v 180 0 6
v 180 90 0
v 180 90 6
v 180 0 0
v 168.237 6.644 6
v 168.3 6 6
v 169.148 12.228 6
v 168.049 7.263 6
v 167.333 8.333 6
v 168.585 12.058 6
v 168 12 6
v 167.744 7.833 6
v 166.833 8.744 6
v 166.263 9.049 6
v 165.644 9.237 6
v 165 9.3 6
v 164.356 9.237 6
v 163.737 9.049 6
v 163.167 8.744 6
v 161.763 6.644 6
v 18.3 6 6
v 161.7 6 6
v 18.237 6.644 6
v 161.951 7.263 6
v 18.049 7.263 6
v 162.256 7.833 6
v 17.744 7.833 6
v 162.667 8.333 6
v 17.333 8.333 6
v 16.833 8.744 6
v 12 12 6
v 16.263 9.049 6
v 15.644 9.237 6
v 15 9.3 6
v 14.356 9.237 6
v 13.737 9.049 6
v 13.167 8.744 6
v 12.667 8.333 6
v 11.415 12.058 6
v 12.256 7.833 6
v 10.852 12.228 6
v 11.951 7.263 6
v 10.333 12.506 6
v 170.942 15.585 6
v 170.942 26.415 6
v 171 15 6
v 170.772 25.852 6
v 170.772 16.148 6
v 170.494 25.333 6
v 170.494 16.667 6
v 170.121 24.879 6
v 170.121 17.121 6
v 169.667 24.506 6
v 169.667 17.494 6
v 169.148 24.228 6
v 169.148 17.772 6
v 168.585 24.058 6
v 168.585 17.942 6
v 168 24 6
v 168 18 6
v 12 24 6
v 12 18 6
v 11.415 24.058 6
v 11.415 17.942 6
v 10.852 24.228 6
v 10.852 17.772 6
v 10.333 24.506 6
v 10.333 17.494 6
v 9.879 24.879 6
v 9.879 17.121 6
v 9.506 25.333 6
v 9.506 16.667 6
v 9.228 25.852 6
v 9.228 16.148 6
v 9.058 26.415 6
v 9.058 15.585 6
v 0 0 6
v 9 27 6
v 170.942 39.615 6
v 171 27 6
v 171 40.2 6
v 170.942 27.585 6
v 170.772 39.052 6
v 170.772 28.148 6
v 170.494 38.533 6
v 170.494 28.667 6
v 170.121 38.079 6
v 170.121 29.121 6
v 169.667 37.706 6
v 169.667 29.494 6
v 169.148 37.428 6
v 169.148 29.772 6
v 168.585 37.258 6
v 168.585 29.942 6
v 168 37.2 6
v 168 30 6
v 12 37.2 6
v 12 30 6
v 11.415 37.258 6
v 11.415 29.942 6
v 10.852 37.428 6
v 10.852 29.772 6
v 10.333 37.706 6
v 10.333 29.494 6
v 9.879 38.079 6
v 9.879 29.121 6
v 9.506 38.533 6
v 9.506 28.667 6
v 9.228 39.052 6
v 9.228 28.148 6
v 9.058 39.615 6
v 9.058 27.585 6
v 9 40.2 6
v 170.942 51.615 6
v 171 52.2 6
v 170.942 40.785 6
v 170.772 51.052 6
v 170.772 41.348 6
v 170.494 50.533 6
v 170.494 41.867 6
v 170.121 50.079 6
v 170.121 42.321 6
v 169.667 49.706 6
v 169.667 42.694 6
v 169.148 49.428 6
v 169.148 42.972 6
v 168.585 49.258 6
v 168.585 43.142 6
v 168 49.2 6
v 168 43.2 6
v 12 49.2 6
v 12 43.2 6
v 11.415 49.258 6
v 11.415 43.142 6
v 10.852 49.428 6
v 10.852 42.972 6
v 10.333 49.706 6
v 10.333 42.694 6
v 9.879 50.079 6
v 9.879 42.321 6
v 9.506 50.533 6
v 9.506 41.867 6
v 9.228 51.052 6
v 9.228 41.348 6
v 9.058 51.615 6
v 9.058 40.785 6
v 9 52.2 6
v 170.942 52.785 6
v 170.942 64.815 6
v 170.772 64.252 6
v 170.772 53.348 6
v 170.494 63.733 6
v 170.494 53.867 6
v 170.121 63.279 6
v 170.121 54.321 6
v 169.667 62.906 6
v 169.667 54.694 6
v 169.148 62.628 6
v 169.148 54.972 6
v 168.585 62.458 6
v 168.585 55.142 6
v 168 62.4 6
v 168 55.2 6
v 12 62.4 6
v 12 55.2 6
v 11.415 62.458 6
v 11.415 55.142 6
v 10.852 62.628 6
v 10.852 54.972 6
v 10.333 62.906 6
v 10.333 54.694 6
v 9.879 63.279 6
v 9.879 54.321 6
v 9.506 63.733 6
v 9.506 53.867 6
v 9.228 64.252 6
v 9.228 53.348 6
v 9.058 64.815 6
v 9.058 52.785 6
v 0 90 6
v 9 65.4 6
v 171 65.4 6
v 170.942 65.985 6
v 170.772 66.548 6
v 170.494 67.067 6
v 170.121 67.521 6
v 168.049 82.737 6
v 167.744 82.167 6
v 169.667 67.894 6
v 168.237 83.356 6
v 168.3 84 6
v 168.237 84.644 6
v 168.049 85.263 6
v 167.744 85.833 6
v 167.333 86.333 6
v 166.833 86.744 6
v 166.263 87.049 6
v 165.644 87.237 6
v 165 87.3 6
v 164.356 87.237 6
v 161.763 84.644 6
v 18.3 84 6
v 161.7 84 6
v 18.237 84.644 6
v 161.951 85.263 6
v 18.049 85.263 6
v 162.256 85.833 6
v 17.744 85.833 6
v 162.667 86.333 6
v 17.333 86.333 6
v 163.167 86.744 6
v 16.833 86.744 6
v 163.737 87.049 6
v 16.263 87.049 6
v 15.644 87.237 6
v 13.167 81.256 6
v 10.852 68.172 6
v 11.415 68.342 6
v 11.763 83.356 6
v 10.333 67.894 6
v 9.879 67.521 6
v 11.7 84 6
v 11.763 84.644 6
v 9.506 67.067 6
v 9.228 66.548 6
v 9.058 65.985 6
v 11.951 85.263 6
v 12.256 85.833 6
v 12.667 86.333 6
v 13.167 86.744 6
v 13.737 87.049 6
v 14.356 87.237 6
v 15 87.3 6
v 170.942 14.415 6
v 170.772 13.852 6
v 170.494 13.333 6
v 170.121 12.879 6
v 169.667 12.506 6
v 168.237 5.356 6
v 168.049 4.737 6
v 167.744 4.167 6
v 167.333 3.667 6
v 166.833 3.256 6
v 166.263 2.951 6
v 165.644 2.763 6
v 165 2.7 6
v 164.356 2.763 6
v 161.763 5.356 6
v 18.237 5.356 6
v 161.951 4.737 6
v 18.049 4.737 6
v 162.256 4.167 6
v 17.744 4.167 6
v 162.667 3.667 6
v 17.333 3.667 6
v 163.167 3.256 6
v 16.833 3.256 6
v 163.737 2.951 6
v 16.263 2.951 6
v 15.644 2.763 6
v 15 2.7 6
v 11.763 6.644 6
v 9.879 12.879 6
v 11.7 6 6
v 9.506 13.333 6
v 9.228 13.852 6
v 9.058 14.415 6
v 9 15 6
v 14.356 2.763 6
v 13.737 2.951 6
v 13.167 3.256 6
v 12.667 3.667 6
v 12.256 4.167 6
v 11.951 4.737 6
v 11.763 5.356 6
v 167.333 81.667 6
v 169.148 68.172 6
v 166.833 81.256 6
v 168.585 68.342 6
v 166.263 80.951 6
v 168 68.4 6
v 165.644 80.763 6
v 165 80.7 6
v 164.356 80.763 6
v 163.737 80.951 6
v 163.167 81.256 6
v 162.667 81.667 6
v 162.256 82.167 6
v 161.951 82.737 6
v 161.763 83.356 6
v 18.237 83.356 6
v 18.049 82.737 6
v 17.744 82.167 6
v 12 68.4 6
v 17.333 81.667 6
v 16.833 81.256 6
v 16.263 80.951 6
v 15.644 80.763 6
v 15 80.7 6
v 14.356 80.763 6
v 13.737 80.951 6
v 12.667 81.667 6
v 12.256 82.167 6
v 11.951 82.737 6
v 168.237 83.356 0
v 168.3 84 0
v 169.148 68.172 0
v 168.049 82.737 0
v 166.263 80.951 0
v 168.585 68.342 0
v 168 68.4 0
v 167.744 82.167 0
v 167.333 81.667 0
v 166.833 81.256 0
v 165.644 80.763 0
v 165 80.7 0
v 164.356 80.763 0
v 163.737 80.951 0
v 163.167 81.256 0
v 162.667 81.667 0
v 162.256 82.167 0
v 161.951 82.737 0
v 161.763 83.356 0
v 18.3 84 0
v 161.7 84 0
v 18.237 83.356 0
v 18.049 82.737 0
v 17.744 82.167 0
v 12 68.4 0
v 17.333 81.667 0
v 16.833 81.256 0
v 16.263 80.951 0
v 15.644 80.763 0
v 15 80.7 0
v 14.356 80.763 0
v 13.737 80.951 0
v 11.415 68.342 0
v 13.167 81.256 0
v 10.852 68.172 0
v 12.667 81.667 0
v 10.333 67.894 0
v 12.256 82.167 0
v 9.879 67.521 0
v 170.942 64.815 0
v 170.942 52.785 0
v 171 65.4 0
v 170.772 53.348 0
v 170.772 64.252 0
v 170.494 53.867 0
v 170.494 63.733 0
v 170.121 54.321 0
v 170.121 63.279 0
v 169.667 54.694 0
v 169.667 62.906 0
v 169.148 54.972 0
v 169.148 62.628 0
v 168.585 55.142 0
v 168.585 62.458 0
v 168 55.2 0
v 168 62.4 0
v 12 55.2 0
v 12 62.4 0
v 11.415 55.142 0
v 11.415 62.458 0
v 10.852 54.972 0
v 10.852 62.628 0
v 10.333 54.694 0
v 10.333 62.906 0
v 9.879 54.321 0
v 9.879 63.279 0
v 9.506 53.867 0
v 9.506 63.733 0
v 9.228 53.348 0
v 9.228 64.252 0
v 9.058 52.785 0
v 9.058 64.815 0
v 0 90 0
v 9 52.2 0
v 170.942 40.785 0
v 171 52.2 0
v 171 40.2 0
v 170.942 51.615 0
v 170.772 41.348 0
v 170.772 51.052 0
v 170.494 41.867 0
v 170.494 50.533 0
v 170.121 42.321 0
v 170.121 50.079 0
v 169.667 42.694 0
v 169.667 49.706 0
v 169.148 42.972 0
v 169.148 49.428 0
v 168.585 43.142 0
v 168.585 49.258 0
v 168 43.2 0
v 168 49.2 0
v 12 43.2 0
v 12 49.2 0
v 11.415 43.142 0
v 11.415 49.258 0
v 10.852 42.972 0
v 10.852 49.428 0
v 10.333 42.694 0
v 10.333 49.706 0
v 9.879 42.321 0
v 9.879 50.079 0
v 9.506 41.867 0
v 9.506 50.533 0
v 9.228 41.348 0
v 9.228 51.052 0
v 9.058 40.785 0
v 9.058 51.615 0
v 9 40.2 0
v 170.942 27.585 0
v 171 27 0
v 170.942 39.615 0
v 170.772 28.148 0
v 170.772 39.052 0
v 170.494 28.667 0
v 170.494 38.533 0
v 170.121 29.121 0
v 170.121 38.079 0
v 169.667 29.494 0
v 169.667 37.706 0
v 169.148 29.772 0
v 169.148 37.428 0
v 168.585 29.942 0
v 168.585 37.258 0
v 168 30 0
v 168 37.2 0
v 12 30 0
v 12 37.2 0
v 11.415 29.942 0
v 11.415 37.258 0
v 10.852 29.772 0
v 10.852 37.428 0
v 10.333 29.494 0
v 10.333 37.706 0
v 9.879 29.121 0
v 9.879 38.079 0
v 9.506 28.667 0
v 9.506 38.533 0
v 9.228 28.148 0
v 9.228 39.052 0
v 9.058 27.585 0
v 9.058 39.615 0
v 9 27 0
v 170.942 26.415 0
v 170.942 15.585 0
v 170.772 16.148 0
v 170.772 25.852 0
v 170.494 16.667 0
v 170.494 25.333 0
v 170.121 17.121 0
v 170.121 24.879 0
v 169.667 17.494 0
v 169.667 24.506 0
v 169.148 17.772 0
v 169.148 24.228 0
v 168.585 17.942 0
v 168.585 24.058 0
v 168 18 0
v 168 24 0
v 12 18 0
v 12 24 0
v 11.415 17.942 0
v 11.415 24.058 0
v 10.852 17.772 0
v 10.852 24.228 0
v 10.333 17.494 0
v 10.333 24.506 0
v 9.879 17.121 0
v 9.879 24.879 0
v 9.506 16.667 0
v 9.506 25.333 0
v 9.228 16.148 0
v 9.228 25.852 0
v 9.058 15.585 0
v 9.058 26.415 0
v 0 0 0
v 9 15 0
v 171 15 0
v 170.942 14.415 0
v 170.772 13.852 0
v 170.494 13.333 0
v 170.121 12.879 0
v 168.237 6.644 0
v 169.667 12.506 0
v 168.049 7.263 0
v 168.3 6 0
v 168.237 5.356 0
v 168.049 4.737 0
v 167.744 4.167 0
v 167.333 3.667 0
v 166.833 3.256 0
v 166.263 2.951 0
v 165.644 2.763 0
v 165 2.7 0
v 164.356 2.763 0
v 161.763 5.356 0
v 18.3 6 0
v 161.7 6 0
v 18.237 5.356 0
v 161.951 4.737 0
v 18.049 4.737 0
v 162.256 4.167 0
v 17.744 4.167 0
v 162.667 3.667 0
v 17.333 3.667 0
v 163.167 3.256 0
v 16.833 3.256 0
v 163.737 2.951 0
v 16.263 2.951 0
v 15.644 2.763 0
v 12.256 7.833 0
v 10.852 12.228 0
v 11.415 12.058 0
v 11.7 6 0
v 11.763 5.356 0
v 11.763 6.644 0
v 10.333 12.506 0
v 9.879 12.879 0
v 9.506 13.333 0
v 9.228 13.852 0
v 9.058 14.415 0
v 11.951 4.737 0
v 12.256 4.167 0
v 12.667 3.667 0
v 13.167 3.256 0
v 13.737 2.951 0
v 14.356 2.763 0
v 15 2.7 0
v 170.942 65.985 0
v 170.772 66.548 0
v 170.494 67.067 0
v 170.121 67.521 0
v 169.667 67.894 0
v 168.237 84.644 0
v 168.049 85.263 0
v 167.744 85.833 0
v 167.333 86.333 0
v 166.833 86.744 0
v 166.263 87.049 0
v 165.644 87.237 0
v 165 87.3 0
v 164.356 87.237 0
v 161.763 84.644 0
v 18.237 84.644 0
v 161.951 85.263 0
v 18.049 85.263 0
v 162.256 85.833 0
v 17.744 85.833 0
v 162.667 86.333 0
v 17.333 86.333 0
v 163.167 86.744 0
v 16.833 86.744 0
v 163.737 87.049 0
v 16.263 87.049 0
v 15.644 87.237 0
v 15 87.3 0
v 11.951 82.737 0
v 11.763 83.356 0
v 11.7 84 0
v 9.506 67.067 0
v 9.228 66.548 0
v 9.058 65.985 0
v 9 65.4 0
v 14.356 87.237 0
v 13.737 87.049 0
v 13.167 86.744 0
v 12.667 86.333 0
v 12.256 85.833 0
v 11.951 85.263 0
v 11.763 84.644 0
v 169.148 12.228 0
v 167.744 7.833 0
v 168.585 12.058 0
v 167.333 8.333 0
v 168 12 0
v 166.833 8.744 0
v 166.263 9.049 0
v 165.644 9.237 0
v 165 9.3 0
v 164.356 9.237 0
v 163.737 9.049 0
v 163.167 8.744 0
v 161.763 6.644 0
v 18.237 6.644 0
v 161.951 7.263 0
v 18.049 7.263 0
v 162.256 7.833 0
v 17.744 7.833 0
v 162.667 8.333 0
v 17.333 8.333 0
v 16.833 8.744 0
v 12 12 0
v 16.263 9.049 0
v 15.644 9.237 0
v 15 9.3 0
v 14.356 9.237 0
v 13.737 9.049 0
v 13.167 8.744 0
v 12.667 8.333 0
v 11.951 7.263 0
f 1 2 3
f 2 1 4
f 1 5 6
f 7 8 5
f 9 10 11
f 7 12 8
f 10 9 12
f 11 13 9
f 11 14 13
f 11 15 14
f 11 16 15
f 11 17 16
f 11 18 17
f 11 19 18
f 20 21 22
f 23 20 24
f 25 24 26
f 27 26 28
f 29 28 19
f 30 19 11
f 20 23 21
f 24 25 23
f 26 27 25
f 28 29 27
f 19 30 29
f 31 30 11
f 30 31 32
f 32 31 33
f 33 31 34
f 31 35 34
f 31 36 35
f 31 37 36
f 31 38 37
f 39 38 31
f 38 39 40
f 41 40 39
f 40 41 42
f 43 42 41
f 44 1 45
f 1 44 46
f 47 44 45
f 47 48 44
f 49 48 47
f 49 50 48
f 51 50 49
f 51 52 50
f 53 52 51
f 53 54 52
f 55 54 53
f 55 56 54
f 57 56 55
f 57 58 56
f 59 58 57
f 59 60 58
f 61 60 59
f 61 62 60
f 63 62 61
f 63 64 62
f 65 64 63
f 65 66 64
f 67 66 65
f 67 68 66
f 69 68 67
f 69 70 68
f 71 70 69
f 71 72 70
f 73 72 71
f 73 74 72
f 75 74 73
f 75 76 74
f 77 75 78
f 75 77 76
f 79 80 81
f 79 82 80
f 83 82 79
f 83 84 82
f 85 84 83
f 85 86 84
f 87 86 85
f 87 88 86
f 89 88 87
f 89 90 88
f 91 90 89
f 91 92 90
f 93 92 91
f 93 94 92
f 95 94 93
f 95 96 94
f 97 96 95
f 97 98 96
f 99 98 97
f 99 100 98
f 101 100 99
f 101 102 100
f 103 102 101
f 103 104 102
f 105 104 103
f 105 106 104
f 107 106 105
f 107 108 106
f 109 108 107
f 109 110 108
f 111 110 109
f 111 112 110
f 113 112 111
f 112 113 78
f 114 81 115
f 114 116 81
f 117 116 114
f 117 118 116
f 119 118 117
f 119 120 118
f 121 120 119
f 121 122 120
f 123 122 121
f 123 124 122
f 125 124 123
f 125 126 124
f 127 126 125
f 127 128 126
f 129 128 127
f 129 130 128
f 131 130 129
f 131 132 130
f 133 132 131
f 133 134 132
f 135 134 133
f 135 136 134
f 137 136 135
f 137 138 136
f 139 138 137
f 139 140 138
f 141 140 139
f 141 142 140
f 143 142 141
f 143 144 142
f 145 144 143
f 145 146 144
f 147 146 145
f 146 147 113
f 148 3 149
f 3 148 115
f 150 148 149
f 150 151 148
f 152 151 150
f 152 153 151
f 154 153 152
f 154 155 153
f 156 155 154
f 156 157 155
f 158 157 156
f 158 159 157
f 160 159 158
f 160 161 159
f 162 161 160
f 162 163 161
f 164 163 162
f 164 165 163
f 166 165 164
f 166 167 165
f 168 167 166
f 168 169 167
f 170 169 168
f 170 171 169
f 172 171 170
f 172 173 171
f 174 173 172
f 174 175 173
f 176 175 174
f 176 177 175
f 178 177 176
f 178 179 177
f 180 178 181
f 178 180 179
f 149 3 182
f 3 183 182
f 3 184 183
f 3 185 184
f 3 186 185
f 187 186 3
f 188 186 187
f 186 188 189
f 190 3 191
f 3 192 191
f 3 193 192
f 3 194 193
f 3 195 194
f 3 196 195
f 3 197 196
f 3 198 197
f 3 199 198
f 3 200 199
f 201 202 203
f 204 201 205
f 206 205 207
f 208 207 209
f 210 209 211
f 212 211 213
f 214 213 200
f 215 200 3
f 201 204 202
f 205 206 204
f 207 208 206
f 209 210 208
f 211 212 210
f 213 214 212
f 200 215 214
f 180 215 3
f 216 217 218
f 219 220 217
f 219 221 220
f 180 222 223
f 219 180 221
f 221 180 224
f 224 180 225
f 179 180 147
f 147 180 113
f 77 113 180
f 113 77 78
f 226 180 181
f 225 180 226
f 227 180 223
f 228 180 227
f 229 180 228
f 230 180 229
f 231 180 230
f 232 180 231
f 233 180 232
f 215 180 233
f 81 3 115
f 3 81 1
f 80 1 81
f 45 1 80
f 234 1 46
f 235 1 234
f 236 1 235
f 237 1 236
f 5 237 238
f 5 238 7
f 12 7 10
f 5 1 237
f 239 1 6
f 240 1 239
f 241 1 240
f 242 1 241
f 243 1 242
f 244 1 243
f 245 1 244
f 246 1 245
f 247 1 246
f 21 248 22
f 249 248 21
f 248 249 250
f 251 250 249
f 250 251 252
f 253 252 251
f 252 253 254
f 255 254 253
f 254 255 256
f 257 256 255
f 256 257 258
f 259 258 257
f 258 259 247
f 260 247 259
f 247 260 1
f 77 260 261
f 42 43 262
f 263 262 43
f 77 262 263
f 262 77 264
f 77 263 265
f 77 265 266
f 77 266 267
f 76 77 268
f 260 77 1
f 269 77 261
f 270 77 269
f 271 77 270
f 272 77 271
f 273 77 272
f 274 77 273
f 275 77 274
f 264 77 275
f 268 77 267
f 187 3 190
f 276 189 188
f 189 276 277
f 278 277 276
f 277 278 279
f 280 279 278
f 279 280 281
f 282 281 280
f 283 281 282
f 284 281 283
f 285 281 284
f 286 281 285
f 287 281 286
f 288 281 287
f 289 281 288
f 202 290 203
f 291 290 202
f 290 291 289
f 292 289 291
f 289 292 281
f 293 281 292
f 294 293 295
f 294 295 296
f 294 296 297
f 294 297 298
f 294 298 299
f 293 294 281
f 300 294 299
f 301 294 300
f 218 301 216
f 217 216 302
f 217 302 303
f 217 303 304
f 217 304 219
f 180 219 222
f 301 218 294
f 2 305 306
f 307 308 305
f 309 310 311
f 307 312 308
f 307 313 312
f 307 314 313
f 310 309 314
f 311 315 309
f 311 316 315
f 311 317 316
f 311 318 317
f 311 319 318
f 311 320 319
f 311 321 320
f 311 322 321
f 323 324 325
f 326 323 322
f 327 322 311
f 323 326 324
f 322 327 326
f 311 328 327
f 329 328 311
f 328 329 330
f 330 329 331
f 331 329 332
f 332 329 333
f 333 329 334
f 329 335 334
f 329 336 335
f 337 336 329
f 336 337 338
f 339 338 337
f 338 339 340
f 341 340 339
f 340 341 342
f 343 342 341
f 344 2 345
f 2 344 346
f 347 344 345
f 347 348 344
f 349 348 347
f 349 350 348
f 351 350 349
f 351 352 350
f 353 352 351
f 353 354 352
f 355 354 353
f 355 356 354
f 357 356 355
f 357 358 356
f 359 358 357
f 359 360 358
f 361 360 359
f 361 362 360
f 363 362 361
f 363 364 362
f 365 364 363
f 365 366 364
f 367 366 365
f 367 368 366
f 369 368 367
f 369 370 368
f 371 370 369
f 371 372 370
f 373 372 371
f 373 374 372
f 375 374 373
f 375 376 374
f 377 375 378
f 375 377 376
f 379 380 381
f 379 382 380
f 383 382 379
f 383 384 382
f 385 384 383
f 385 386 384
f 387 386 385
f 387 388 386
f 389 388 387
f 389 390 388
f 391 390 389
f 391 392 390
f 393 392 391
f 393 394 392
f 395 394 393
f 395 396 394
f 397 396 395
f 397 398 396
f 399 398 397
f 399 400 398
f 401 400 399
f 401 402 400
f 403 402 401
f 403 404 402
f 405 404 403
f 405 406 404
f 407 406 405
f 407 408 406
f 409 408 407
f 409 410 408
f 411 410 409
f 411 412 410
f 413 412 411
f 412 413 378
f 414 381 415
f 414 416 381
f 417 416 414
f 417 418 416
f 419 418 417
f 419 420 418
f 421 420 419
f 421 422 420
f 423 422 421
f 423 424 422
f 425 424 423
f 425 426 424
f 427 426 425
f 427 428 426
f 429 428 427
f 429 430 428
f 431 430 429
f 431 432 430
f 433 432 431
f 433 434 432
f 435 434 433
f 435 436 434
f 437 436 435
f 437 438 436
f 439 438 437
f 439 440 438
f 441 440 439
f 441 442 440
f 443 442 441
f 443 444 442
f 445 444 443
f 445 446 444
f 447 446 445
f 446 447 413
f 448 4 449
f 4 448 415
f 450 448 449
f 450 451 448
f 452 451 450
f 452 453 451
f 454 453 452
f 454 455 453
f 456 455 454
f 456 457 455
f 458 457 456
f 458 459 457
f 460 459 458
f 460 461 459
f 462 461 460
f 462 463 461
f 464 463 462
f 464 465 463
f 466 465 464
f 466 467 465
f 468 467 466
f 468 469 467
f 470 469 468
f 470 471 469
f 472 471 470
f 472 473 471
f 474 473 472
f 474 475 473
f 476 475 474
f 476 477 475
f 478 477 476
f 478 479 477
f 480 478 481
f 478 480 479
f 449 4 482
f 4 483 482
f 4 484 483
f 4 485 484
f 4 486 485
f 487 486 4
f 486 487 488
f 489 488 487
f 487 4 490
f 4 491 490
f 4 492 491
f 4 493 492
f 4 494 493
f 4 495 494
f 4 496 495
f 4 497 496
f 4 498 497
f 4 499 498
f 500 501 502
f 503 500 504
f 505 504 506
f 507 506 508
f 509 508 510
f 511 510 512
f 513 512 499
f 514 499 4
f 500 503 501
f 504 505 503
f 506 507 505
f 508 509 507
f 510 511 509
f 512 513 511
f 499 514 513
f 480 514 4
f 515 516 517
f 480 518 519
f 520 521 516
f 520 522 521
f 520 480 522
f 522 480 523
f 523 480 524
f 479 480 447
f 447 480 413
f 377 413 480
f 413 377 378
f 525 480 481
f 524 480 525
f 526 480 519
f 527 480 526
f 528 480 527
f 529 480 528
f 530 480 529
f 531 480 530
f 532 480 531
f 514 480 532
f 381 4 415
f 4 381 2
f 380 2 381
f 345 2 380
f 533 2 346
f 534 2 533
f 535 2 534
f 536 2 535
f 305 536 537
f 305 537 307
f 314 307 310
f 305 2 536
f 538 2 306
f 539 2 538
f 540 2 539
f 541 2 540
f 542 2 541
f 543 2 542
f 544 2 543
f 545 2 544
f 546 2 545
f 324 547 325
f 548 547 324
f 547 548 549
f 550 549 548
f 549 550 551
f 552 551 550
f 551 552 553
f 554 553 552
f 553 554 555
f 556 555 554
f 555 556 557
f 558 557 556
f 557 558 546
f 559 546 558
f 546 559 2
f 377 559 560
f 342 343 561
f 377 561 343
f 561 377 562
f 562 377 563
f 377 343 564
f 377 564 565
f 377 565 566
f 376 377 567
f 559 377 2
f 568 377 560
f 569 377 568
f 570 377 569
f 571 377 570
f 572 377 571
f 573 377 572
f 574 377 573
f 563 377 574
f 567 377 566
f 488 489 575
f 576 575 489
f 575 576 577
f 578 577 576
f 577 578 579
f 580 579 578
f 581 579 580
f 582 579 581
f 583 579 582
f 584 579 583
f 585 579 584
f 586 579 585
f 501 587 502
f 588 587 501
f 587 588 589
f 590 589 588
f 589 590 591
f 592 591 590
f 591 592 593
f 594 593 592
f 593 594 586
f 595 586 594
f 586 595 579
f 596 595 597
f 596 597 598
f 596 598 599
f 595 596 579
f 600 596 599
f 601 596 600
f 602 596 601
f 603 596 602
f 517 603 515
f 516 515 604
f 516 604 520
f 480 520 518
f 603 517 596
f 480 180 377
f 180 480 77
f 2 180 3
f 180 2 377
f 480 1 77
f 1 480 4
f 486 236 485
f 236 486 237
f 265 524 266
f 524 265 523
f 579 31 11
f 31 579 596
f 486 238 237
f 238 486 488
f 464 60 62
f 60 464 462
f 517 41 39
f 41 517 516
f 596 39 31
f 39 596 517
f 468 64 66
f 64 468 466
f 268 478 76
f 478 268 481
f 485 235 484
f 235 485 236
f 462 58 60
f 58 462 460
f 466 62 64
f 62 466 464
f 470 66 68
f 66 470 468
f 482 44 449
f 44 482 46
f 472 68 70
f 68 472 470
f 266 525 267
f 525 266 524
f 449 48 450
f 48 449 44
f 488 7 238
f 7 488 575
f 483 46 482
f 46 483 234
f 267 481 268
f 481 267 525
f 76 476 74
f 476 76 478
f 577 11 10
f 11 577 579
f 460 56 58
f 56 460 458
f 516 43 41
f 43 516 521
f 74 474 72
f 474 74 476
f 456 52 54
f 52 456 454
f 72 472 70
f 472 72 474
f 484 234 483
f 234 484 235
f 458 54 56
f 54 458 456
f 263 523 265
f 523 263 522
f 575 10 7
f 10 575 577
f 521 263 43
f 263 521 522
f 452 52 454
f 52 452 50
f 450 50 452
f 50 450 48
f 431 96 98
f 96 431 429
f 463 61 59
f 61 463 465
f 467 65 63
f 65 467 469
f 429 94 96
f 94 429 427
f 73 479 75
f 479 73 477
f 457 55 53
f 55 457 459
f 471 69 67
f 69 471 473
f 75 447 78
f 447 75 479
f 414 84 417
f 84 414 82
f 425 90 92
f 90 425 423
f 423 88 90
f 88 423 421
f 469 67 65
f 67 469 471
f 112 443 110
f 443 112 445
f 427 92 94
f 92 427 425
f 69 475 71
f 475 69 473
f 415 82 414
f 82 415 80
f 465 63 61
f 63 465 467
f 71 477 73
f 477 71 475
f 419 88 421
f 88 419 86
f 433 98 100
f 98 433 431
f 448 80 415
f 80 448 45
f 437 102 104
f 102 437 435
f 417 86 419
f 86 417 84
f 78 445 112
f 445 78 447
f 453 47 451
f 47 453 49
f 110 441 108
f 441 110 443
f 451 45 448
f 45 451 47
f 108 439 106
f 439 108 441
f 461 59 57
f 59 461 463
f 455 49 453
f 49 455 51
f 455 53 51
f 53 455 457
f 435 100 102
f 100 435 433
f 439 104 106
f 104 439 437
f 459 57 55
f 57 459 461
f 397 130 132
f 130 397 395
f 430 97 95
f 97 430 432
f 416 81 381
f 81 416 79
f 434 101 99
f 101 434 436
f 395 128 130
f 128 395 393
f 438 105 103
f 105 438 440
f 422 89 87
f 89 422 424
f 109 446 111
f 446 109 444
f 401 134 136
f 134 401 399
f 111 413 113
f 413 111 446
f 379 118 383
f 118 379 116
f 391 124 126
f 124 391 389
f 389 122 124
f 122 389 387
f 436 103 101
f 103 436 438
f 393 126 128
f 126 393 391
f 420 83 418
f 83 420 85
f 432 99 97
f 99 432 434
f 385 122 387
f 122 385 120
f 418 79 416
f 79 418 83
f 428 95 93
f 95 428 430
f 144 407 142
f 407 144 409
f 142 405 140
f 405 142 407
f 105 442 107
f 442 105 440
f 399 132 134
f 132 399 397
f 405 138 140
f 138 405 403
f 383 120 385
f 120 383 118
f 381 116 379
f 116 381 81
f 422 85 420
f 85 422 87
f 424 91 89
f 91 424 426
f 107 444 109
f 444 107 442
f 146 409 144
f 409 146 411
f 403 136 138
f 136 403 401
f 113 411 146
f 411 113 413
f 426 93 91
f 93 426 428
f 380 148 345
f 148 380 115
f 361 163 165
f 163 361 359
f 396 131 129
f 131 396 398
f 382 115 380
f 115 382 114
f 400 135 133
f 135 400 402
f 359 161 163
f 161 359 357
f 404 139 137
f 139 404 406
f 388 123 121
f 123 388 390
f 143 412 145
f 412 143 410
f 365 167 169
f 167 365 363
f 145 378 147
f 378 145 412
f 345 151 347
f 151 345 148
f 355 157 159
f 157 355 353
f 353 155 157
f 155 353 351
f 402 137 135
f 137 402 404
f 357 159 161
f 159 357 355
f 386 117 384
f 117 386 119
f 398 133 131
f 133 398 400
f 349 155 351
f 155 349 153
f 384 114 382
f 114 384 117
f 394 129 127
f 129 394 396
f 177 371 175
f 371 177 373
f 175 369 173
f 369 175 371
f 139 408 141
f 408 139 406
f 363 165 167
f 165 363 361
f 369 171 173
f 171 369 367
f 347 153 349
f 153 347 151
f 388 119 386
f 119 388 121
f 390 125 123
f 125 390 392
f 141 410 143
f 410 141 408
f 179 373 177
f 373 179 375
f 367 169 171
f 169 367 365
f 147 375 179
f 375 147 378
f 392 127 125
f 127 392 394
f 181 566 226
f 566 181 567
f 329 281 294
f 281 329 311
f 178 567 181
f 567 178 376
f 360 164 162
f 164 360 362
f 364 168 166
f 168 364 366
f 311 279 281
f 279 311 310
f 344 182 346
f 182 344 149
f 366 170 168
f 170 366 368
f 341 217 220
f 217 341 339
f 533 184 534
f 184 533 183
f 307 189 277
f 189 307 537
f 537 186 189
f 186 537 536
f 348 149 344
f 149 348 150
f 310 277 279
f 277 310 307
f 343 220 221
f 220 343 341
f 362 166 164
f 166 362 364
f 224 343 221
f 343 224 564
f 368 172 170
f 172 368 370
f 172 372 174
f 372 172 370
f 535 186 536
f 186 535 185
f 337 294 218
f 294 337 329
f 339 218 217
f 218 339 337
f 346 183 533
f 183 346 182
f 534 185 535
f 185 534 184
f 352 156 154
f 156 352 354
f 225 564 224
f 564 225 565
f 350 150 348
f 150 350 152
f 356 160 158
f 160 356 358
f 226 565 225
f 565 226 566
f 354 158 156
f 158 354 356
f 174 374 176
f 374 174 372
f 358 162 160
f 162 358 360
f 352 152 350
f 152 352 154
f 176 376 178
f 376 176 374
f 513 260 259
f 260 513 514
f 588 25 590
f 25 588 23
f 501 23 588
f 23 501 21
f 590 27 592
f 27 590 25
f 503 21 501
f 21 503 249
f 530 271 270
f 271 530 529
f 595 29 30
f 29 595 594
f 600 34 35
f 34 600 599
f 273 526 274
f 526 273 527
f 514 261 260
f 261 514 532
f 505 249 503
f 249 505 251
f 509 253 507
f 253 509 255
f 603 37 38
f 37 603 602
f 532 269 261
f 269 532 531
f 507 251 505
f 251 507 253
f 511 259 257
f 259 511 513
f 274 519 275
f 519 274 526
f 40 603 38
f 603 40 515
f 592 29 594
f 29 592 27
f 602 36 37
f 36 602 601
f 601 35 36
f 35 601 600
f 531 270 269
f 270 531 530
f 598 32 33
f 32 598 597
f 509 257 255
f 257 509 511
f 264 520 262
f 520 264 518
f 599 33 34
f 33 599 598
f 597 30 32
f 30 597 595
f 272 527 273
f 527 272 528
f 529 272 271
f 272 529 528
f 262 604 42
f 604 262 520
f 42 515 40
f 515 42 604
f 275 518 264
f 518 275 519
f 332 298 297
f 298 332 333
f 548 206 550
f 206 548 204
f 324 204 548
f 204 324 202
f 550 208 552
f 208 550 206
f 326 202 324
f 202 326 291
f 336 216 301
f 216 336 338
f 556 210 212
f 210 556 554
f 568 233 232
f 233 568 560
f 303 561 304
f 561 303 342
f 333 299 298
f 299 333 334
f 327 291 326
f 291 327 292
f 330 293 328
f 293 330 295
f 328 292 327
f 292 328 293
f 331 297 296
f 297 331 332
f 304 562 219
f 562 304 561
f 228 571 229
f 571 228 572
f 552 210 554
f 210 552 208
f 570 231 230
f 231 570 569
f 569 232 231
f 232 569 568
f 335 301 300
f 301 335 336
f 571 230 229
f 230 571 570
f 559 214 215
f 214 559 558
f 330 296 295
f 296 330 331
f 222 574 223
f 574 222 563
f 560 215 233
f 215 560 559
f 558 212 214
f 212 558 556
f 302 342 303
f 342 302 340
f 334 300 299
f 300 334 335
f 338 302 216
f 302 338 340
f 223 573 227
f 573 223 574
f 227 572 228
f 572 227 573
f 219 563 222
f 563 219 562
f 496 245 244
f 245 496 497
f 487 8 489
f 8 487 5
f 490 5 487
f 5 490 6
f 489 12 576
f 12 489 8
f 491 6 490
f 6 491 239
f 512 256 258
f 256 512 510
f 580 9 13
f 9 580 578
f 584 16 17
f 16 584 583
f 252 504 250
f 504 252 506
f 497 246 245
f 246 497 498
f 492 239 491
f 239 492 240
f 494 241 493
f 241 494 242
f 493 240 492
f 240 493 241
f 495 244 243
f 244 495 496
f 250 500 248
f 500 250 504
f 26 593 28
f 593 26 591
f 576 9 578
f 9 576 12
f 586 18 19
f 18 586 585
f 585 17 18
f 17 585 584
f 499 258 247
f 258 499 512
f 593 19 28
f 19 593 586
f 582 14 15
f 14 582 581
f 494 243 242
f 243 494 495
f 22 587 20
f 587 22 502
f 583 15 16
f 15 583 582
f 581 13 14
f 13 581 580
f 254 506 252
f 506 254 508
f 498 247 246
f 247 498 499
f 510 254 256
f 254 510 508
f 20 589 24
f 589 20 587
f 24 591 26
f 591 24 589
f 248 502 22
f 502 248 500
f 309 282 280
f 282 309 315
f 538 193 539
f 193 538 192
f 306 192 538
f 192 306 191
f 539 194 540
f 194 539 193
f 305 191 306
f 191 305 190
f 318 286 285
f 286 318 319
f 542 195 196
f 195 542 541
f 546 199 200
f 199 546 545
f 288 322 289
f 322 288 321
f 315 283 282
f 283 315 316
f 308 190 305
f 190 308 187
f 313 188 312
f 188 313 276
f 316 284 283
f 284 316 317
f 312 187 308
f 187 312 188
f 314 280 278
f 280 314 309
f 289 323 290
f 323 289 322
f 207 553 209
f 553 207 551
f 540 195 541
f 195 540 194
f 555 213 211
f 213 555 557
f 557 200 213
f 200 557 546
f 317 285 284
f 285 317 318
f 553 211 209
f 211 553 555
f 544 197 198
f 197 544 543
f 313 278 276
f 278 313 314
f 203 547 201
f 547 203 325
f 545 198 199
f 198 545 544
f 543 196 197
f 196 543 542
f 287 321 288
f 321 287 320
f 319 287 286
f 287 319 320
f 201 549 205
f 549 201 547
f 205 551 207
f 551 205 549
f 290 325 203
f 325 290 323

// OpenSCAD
$fn = 32;

// ----------------------------------------------------------------------
// Slotted panel: 180 x 90 mm, 5 рядов of slots
// ----------------------------------------------------------------------

// --- parameters (mm) ---
panel_w = 180;            // panel width
panel_d = 90;             // panel depth
thick = 6;                // panel thickness
slot_w = 6;               // slot width
pitch0 = 12;              // first row pitch
pitch_step = 1.2;         // pitch increase per row
margin = 12;              // margin around the slot field
rows = 5;                 // number of slot rows
mount_d = 6.6;            // mounting holes
mount_x = 75;             // mounting hole offset

difference() {
  union() {
    cube([panel_w, panel_d, thick]);
  }
  /* slot rows: stadium shaped cutters, 2.5 mm clear of both faces */
  /* row 0: pitch 12, length 156 */
  hull() {
    translate([12, 15, -2.5]) cylinder(h = thick + 5, d = slot_w);
    translate([168, 15, -2.5]) cylinder(h = thick + 5, d = slot_w);
  }
  /* row 1: pitch 13.2, length 156 */
  hull() {
    translate([12, 27, -2.5]) cylinder(h = thick + 5, d = slot_w);
    translate([168, 27, -2.5]) cylinder(h = thick + 5, d = slot_w);
  }
  /* row 2: pitch 12, length 156 */
  hull() {
    translate([12, 40.2, -2.5]) cylinder(h = thick + 5, d = slot_w);
    translate([168, 40.2, -2.5]) cylinder(h = thick + 5, d = slot_w);
  }
  /* row 3: pitch 13.2, length 156 */
  hull() {
    translate([12, 52.2, -2.5]) cylinder(h = thick + 5, d = slot_w);
    translate([168, 52.2, -2.5]) cylinder(h = thick + 5, d = slot_w);
  }
  /* row 4: pitch 12, length 156 */
  hull() {
    translate([12, 65.4, -2.5]) cylinder(h = thick + 5, d = slot_w);
    translate([168, 65.4, -2.5]) cylinder(h = thick + 5, d = slot_w);
  }
  translate([15, 6, -2.5]) cylinder(h = 11, d = mount_d);
  translate([15, 84, -2.5]) cylinder(h = 11, d = mount_d);
  translate([165, 6, -2.5]) cylinder(h = 11, d = mount_d);
  translate([165, 84, -2.5]) cylinder(h = 11, d = mount_d);
}
